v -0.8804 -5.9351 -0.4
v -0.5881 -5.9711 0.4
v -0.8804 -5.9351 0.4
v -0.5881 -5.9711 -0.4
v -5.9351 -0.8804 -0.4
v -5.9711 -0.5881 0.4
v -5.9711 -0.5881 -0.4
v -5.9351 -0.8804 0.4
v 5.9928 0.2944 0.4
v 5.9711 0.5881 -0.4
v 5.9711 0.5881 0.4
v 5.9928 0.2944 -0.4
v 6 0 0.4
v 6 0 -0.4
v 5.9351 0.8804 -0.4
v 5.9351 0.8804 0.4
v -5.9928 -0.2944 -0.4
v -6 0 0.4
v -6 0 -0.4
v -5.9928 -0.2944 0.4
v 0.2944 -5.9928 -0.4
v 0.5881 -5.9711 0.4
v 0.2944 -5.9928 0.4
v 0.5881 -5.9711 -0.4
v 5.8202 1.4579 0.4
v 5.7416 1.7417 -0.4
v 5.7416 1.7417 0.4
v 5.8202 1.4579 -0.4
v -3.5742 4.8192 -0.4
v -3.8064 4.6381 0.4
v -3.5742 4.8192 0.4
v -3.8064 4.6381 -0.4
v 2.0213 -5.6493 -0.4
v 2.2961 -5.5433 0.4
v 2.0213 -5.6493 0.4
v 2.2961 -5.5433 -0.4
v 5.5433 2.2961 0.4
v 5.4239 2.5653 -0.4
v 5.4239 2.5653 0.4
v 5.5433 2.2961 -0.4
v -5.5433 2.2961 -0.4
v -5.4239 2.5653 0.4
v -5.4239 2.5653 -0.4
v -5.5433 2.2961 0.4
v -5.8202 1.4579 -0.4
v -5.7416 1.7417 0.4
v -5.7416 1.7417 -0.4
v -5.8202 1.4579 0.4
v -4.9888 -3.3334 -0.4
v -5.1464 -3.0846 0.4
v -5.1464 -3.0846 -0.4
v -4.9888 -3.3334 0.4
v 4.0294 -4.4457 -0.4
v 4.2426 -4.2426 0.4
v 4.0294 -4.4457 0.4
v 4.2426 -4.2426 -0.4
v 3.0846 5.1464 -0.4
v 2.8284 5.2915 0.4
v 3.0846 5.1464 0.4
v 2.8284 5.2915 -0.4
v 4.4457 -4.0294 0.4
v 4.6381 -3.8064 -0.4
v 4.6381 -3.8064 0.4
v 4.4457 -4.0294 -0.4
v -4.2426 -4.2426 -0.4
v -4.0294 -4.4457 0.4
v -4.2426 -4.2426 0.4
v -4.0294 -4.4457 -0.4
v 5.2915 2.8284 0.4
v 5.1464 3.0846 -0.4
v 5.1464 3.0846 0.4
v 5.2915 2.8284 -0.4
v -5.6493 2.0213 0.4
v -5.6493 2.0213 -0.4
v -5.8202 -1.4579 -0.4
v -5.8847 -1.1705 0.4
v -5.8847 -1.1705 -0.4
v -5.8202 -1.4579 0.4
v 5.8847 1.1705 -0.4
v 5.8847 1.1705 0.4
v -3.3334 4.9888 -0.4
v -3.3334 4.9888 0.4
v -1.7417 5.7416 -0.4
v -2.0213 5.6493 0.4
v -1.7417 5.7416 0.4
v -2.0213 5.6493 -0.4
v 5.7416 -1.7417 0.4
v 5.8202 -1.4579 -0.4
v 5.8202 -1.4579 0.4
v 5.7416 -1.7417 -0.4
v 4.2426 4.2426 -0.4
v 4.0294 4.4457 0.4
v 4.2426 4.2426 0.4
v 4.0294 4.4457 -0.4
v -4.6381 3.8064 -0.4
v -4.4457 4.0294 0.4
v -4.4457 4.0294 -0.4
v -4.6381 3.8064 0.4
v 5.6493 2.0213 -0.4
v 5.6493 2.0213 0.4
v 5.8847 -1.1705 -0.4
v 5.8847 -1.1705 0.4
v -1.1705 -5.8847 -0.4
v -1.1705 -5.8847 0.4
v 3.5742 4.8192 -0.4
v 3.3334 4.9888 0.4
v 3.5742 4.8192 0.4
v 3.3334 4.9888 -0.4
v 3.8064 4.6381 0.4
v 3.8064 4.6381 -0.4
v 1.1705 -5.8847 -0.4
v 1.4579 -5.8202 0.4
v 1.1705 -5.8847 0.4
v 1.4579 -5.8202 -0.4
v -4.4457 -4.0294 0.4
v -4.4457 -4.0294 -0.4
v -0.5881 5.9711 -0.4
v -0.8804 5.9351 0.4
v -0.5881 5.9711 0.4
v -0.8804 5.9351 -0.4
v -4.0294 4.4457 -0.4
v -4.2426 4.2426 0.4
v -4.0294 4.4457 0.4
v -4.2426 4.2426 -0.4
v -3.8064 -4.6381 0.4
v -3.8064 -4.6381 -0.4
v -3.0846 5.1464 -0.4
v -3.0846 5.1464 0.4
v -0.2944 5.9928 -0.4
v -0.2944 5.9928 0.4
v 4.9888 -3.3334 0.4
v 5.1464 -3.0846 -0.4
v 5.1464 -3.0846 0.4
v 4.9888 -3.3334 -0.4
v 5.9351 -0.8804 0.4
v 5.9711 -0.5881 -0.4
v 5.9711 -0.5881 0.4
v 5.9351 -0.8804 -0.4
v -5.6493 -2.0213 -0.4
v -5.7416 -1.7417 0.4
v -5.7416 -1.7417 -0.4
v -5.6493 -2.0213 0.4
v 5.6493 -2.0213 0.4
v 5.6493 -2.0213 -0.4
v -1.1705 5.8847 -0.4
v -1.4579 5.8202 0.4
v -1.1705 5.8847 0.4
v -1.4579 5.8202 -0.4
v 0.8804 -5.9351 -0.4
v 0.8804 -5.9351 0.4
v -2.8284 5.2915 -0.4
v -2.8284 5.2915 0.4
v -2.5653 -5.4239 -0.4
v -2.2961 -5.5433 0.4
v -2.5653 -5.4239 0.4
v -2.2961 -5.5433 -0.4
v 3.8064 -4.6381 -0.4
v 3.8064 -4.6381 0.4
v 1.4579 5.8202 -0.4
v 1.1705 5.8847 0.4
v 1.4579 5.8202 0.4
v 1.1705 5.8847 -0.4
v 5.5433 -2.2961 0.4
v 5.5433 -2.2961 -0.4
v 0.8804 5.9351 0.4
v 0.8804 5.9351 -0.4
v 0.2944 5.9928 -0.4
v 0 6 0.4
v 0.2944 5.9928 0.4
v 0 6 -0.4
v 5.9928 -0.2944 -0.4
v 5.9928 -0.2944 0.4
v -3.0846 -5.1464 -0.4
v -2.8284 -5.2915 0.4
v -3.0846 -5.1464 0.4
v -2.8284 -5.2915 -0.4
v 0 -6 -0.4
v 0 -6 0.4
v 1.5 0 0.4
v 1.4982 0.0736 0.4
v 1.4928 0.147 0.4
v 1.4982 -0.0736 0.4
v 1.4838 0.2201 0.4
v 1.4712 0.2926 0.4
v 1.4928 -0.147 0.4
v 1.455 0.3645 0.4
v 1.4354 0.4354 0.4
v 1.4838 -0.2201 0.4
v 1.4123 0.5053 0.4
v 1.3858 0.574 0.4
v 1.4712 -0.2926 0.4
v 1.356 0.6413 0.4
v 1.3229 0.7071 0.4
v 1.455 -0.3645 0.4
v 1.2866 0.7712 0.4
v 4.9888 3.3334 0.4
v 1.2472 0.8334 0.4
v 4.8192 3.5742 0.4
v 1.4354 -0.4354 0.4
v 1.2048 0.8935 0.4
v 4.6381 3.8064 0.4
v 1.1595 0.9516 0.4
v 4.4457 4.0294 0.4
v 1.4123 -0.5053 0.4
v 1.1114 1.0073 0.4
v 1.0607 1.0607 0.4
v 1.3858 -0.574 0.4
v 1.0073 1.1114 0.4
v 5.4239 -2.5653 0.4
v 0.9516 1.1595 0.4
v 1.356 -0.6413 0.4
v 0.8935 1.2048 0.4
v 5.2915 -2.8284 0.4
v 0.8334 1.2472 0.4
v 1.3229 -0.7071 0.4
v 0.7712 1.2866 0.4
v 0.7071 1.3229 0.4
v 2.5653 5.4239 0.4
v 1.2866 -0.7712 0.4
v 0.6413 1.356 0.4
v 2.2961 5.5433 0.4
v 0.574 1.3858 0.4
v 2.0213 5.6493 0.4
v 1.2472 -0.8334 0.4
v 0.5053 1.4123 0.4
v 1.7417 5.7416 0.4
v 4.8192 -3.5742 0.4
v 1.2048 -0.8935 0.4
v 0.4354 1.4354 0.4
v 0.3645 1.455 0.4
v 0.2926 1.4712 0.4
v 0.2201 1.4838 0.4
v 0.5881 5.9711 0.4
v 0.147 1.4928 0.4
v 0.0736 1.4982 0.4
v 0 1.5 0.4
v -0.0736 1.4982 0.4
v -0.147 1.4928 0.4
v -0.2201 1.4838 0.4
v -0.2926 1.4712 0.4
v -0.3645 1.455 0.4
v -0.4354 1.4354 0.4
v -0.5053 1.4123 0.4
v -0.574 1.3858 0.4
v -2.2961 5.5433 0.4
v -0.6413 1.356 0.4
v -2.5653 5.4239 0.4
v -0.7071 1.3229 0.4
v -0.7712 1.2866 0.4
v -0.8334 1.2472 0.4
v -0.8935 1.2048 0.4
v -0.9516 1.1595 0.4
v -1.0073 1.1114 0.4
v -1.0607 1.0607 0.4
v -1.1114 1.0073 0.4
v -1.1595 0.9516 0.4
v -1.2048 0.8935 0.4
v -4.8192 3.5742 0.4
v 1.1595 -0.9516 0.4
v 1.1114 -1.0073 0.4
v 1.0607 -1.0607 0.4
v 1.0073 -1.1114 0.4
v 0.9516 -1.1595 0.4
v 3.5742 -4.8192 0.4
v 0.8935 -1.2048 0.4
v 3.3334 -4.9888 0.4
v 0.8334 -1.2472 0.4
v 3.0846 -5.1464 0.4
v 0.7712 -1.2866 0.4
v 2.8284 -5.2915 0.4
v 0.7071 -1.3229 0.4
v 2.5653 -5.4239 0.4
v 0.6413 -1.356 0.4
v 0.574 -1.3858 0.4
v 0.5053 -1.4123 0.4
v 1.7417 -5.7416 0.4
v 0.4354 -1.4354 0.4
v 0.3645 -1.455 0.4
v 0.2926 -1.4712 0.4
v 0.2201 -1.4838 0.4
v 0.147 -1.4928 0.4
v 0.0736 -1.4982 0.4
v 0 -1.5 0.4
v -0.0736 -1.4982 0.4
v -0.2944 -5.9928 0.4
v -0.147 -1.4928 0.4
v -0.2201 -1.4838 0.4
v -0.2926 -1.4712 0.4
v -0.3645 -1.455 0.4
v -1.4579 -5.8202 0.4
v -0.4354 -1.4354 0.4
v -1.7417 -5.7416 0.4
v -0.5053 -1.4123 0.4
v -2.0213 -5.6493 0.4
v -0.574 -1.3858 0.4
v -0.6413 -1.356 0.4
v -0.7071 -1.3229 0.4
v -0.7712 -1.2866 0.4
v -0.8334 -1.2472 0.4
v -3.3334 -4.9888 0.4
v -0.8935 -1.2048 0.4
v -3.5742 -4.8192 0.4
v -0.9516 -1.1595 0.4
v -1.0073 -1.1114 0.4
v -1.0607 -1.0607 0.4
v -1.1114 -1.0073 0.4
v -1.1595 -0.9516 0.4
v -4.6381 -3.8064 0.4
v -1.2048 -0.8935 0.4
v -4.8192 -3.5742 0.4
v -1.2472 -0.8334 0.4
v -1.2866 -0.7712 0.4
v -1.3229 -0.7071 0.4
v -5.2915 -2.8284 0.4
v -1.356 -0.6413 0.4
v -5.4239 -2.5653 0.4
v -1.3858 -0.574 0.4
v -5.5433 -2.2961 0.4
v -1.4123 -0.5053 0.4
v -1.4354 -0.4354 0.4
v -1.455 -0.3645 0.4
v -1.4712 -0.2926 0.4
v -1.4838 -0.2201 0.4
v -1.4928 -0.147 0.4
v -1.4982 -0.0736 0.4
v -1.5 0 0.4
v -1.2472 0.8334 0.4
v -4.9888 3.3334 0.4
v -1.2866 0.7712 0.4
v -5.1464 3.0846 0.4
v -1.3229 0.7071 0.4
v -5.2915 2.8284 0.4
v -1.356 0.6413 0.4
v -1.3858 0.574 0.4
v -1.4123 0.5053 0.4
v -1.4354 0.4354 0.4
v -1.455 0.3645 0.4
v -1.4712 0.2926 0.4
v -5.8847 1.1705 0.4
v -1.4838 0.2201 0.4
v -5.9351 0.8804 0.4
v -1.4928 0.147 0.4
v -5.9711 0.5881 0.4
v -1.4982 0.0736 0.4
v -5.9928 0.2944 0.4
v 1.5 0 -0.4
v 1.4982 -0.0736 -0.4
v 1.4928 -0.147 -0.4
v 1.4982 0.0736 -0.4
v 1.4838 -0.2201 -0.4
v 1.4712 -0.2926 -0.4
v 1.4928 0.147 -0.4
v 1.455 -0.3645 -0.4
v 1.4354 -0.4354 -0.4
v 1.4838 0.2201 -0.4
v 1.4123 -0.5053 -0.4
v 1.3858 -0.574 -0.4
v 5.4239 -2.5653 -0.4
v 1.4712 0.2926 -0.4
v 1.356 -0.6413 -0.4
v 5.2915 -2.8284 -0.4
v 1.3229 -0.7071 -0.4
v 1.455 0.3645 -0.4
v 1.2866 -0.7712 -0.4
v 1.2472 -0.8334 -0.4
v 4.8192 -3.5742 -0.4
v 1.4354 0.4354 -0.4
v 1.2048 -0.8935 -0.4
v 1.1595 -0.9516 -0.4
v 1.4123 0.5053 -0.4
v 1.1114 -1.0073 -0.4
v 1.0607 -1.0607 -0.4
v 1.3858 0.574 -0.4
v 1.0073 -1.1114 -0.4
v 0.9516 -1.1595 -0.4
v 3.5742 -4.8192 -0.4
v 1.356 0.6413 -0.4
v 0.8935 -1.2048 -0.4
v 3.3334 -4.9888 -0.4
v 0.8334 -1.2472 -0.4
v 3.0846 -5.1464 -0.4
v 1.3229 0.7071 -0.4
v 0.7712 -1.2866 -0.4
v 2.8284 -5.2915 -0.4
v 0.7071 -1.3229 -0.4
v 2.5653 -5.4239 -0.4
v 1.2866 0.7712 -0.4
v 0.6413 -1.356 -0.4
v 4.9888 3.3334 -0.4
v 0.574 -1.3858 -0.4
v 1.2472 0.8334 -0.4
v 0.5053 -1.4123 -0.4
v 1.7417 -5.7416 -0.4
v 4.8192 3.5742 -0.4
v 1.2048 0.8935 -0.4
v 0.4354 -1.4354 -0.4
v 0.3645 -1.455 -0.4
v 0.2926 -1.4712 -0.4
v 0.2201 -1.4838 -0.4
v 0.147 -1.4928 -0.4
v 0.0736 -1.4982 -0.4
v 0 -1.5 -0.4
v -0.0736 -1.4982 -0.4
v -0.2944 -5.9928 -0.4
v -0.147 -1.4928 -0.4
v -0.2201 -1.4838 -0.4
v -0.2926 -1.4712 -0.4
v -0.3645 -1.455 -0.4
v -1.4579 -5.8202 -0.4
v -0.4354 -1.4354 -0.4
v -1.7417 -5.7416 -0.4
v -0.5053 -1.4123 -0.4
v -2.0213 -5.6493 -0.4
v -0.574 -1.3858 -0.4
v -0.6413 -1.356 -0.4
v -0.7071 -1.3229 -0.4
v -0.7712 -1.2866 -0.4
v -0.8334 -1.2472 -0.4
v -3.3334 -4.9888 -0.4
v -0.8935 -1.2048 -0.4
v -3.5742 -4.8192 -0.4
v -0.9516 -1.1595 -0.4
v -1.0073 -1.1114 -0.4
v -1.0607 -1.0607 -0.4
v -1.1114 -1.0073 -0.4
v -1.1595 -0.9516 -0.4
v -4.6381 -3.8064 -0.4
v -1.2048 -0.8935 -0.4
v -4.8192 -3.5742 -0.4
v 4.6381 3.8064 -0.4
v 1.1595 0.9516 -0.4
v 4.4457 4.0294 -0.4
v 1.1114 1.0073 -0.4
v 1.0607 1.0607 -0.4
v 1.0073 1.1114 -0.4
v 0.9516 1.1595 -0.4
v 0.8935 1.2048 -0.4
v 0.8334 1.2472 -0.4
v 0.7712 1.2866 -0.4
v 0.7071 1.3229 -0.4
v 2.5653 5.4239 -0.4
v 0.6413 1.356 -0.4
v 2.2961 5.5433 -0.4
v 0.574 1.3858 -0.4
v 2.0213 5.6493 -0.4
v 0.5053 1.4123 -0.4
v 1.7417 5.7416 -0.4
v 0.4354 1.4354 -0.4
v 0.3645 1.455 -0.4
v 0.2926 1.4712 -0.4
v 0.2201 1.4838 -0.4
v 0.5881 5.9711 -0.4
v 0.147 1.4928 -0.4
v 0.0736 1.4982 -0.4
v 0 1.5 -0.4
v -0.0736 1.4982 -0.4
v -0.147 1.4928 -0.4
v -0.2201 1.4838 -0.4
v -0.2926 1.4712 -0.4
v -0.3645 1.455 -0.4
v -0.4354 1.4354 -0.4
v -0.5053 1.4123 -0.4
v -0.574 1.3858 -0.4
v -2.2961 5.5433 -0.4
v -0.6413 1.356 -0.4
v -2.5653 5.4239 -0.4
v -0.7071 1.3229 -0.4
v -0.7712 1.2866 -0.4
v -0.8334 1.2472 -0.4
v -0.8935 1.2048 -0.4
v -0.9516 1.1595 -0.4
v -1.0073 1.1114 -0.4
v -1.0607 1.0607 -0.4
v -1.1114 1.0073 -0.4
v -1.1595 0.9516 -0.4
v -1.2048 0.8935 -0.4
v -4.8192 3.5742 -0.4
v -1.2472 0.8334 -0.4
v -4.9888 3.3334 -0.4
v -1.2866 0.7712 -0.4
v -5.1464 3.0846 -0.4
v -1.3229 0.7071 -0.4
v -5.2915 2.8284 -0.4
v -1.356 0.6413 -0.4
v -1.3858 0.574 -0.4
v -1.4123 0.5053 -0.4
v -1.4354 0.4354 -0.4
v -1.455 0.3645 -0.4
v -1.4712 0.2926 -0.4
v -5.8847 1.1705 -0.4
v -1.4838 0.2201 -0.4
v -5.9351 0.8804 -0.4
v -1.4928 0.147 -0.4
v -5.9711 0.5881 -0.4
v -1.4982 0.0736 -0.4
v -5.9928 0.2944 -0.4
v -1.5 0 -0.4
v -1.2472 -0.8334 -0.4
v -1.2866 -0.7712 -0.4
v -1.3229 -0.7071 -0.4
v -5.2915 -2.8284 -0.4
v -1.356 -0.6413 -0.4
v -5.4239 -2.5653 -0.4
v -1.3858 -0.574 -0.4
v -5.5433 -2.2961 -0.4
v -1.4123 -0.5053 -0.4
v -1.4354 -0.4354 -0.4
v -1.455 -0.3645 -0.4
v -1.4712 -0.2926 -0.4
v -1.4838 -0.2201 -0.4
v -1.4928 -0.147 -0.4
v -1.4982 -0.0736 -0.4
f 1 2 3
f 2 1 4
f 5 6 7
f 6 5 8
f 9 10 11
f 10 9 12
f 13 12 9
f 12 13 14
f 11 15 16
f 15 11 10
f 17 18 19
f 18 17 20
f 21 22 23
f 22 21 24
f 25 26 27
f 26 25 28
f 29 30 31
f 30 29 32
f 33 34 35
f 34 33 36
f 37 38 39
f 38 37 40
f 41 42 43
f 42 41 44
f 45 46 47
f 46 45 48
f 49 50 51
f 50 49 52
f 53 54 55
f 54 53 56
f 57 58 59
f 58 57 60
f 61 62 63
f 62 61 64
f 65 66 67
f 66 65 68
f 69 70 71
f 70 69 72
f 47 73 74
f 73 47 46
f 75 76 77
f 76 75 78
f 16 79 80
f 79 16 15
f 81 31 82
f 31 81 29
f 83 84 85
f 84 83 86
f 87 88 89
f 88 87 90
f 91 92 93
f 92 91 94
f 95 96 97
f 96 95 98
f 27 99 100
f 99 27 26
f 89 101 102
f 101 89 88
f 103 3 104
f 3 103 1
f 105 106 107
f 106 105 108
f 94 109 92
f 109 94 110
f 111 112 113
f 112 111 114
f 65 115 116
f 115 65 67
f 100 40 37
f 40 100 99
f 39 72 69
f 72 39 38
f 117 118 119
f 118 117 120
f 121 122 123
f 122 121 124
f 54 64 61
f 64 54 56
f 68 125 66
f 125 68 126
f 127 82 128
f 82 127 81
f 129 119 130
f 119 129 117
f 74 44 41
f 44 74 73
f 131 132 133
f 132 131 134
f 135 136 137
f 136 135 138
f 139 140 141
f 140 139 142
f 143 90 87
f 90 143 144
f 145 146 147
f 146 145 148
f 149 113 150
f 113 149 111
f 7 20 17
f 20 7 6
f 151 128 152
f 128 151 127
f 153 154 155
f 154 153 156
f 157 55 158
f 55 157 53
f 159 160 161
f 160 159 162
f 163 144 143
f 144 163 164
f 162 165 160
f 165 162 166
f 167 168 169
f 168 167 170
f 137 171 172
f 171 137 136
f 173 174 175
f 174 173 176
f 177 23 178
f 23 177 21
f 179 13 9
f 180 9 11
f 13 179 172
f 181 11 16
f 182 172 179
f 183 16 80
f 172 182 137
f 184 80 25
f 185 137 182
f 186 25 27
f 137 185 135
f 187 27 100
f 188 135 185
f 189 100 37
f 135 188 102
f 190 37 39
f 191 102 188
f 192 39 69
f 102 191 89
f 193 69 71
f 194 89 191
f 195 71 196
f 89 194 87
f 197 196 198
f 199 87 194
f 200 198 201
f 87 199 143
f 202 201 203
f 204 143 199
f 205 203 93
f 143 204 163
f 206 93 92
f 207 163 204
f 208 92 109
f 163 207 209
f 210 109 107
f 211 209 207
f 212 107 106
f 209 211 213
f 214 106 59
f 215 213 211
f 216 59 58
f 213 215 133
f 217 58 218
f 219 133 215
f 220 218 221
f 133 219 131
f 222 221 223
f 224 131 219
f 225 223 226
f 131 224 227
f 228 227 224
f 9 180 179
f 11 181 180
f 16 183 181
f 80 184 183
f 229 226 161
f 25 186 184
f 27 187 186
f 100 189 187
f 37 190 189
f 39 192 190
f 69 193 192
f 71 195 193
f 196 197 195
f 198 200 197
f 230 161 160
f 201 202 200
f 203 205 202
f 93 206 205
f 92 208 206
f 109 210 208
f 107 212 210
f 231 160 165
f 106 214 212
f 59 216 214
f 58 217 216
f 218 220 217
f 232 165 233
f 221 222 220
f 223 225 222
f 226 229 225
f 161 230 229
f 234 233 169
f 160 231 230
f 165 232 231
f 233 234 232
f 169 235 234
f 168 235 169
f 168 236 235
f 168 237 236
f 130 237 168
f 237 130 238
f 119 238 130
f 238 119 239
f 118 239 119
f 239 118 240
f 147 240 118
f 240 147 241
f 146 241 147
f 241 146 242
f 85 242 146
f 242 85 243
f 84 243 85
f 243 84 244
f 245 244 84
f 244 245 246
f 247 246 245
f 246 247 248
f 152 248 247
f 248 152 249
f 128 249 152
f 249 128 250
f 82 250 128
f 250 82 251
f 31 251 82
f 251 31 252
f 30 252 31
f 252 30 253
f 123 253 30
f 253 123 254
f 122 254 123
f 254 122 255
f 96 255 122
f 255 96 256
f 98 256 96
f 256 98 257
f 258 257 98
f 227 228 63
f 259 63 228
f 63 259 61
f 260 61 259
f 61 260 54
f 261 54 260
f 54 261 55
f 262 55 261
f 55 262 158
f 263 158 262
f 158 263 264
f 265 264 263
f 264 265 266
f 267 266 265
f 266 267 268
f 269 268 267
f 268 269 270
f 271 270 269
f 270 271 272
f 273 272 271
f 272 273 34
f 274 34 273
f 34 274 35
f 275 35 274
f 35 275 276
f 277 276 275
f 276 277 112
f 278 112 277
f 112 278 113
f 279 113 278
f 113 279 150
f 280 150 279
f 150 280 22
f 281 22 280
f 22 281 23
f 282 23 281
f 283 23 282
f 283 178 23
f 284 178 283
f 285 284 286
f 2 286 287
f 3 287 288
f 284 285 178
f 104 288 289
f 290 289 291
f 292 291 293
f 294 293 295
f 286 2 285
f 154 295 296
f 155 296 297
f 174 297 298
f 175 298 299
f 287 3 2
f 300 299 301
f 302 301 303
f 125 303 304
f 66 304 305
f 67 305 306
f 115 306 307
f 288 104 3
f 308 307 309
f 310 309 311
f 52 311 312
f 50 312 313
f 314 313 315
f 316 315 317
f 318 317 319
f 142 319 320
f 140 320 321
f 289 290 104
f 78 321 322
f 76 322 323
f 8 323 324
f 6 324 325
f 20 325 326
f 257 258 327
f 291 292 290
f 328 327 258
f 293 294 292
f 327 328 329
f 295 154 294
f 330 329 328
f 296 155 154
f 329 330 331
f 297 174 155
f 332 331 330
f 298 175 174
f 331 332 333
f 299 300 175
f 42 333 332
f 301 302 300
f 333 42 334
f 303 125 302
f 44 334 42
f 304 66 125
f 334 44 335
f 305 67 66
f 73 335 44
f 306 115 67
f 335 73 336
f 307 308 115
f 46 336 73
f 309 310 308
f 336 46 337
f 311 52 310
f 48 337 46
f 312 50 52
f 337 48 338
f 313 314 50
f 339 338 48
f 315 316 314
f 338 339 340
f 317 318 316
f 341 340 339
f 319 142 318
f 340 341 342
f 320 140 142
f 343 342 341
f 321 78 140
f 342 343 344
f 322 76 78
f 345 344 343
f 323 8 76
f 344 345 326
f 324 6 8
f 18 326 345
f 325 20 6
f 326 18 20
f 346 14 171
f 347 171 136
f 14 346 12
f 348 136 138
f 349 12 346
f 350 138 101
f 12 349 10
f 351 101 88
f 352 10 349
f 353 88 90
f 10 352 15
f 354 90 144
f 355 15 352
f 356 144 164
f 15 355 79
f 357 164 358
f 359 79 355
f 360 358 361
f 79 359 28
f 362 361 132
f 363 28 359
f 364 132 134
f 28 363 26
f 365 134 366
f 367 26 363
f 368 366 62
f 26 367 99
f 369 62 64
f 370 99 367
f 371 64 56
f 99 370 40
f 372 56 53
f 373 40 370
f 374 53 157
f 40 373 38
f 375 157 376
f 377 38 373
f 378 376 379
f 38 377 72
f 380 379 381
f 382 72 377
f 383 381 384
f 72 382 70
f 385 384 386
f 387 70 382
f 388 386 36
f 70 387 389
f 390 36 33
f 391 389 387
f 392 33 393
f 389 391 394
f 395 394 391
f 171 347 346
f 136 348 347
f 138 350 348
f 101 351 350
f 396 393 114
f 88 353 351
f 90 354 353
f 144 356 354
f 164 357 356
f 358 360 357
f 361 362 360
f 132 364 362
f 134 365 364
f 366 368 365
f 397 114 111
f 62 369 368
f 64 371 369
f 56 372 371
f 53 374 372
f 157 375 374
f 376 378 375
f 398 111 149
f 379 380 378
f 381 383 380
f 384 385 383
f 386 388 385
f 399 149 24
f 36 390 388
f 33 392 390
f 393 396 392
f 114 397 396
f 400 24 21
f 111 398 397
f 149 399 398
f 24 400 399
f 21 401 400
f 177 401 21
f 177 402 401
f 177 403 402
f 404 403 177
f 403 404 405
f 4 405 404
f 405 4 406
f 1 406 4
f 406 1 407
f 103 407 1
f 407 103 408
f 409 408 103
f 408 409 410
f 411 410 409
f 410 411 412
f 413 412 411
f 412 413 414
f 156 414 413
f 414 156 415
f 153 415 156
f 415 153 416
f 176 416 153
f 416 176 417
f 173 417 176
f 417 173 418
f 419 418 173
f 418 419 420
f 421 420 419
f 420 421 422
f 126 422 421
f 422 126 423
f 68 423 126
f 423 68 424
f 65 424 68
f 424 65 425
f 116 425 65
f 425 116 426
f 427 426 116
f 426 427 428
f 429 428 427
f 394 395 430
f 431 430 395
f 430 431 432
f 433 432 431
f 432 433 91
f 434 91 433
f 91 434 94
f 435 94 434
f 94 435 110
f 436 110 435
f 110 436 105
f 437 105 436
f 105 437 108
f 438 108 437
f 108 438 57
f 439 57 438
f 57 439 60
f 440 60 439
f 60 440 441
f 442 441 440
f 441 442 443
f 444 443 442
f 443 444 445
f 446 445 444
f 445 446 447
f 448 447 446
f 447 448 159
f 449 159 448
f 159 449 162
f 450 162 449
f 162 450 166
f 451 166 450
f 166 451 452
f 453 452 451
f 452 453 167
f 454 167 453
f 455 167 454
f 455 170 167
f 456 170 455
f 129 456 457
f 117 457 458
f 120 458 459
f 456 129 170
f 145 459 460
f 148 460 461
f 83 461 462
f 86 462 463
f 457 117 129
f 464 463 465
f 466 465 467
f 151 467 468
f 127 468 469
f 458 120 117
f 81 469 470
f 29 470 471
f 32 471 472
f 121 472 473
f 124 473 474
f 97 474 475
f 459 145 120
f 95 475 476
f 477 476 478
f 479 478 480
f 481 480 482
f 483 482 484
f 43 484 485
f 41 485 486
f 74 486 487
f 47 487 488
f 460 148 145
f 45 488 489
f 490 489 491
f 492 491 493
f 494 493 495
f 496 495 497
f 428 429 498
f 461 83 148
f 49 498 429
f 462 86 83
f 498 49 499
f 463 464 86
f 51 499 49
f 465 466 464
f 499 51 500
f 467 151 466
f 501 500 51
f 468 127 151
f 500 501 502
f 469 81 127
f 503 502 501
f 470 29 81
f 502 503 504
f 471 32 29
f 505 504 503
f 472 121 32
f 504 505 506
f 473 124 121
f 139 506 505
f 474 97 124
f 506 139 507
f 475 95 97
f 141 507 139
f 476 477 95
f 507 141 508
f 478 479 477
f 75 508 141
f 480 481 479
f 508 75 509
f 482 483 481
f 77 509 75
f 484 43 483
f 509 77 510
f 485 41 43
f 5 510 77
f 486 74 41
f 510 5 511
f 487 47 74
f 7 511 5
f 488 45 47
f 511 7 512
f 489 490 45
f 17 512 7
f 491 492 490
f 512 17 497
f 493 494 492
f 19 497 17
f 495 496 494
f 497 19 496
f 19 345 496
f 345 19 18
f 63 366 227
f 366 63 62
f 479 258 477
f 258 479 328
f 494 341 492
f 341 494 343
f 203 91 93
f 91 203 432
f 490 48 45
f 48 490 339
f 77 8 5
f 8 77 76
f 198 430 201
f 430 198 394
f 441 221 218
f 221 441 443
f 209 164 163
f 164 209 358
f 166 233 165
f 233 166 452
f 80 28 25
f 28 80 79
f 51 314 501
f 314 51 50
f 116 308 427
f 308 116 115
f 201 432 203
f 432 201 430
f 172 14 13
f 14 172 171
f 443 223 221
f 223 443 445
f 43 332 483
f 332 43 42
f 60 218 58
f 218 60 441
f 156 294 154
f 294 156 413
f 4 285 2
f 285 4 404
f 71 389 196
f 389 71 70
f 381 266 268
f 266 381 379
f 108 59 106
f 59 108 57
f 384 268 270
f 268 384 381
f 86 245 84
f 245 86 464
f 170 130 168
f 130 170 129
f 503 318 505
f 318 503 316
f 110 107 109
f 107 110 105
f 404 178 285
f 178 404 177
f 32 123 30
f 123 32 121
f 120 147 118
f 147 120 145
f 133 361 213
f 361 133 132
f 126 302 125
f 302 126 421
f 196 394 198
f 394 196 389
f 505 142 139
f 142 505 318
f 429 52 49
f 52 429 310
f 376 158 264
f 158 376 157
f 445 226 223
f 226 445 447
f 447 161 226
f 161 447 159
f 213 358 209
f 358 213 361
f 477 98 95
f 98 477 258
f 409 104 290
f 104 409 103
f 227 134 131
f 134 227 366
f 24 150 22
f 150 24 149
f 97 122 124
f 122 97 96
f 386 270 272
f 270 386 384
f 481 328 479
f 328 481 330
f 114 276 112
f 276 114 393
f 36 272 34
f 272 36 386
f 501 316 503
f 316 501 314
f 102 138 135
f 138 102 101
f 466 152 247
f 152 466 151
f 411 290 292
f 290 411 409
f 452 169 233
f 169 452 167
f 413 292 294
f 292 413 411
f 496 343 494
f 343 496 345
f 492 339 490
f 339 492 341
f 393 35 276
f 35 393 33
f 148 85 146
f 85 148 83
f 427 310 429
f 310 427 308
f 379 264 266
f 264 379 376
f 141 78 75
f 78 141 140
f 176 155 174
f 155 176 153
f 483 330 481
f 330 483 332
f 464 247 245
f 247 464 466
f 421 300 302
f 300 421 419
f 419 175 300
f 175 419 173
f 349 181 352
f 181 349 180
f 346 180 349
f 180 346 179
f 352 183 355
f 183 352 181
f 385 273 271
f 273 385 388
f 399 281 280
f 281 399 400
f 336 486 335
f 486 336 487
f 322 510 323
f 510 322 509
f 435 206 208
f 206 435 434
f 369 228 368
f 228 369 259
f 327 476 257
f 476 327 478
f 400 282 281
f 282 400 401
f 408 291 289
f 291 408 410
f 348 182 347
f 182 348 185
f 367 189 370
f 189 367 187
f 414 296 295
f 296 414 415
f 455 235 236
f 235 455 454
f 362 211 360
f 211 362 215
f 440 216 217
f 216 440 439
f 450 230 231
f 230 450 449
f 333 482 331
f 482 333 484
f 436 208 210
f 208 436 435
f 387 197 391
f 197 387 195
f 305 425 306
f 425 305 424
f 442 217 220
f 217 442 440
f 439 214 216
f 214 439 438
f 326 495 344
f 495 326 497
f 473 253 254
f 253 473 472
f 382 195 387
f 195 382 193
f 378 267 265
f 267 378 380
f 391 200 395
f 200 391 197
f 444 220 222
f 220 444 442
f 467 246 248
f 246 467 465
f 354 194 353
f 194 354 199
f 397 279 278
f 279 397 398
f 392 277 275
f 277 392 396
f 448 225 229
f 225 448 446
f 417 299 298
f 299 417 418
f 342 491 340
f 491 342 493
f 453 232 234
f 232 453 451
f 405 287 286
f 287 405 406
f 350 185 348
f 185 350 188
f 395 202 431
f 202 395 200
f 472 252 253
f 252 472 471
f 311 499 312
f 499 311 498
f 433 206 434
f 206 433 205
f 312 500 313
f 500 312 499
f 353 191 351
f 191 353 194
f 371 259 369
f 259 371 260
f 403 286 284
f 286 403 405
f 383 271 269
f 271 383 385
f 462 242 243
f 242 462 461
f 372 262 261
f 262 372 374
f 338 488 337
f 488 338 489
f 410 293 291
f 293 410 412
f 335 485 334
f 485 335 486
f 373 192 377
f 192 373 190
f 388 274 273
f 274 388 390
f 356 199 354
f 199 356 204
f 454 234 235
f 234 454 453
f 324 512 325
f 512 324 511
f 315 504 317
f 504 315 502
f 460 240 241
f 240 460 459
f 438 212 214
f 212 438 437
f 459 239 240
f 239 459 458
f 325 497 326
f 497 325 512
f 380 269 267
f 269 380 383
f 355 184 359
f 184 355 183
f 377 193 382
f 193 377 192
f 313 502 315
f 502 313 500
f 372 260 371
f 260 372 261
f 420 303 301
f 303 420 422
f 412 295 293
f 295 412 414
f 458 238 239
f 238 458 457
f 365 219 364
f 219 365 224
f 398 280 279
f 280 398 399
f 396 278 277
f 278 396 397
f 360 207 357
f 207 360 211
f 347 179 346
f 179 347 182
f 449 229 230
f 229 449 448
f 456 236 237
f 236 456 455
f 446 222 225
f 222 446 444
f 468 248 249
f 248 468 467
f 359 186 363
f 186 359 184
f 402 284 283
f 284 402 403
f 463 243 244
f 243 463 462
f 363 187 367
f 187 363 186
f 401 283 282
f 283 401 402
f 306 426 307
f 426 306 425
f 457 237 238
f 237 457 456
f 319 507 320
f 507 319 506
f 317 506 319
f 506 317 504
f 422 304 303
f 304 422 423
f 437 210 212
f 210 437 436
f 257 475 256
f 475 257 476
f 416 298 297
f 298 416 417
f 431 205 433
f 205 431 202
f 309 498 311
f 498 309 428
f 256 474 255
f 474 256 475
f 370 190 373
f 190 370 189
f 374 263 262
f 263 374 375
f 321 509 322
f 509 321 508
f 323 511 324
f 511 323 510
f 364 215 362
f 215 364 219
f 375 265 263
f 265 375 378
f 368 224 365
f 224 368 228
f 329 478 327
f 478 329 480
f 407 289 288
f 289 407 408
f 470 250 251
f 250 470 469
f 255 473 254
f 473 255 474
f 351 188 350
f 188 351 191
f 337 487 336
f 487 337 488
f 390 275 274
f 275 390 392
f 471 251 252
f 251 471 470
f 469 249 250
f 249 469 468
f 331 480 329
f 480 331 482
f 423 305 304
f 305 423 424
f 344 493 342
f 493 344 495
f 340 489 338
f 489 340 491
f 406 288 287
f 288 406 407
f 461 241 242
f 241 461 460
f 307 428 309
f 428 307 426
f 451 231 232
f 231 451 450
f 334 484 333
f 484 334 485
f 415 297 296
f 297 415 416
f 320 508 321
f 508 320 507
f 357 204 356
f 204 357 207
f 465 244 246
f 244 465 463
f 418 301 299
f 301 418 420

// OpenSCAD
// Penny washer parameters (mm)
inner_diameter_mm = 3.0;   // required: 3.0mm hole
outer_diameter_mm = 12.0;  // required: 12.0mm OD
thickness_mm      = 0.8;   // required: 0.8mm thickness

// Small epsilon to guarantee clean subtraction
eps_mm = 0.2;

$fn = 128;

difference() {
    // Outer disk
    cylinder(d = outer_diameter_mm, h = thickness_mm, center = true);

    // Through hole (slightly taller to ensure it fully cuts)
    cylinder(d = inner_diameter_mm, h = thickness_mm + 2*eps_mm, center = true);
}
